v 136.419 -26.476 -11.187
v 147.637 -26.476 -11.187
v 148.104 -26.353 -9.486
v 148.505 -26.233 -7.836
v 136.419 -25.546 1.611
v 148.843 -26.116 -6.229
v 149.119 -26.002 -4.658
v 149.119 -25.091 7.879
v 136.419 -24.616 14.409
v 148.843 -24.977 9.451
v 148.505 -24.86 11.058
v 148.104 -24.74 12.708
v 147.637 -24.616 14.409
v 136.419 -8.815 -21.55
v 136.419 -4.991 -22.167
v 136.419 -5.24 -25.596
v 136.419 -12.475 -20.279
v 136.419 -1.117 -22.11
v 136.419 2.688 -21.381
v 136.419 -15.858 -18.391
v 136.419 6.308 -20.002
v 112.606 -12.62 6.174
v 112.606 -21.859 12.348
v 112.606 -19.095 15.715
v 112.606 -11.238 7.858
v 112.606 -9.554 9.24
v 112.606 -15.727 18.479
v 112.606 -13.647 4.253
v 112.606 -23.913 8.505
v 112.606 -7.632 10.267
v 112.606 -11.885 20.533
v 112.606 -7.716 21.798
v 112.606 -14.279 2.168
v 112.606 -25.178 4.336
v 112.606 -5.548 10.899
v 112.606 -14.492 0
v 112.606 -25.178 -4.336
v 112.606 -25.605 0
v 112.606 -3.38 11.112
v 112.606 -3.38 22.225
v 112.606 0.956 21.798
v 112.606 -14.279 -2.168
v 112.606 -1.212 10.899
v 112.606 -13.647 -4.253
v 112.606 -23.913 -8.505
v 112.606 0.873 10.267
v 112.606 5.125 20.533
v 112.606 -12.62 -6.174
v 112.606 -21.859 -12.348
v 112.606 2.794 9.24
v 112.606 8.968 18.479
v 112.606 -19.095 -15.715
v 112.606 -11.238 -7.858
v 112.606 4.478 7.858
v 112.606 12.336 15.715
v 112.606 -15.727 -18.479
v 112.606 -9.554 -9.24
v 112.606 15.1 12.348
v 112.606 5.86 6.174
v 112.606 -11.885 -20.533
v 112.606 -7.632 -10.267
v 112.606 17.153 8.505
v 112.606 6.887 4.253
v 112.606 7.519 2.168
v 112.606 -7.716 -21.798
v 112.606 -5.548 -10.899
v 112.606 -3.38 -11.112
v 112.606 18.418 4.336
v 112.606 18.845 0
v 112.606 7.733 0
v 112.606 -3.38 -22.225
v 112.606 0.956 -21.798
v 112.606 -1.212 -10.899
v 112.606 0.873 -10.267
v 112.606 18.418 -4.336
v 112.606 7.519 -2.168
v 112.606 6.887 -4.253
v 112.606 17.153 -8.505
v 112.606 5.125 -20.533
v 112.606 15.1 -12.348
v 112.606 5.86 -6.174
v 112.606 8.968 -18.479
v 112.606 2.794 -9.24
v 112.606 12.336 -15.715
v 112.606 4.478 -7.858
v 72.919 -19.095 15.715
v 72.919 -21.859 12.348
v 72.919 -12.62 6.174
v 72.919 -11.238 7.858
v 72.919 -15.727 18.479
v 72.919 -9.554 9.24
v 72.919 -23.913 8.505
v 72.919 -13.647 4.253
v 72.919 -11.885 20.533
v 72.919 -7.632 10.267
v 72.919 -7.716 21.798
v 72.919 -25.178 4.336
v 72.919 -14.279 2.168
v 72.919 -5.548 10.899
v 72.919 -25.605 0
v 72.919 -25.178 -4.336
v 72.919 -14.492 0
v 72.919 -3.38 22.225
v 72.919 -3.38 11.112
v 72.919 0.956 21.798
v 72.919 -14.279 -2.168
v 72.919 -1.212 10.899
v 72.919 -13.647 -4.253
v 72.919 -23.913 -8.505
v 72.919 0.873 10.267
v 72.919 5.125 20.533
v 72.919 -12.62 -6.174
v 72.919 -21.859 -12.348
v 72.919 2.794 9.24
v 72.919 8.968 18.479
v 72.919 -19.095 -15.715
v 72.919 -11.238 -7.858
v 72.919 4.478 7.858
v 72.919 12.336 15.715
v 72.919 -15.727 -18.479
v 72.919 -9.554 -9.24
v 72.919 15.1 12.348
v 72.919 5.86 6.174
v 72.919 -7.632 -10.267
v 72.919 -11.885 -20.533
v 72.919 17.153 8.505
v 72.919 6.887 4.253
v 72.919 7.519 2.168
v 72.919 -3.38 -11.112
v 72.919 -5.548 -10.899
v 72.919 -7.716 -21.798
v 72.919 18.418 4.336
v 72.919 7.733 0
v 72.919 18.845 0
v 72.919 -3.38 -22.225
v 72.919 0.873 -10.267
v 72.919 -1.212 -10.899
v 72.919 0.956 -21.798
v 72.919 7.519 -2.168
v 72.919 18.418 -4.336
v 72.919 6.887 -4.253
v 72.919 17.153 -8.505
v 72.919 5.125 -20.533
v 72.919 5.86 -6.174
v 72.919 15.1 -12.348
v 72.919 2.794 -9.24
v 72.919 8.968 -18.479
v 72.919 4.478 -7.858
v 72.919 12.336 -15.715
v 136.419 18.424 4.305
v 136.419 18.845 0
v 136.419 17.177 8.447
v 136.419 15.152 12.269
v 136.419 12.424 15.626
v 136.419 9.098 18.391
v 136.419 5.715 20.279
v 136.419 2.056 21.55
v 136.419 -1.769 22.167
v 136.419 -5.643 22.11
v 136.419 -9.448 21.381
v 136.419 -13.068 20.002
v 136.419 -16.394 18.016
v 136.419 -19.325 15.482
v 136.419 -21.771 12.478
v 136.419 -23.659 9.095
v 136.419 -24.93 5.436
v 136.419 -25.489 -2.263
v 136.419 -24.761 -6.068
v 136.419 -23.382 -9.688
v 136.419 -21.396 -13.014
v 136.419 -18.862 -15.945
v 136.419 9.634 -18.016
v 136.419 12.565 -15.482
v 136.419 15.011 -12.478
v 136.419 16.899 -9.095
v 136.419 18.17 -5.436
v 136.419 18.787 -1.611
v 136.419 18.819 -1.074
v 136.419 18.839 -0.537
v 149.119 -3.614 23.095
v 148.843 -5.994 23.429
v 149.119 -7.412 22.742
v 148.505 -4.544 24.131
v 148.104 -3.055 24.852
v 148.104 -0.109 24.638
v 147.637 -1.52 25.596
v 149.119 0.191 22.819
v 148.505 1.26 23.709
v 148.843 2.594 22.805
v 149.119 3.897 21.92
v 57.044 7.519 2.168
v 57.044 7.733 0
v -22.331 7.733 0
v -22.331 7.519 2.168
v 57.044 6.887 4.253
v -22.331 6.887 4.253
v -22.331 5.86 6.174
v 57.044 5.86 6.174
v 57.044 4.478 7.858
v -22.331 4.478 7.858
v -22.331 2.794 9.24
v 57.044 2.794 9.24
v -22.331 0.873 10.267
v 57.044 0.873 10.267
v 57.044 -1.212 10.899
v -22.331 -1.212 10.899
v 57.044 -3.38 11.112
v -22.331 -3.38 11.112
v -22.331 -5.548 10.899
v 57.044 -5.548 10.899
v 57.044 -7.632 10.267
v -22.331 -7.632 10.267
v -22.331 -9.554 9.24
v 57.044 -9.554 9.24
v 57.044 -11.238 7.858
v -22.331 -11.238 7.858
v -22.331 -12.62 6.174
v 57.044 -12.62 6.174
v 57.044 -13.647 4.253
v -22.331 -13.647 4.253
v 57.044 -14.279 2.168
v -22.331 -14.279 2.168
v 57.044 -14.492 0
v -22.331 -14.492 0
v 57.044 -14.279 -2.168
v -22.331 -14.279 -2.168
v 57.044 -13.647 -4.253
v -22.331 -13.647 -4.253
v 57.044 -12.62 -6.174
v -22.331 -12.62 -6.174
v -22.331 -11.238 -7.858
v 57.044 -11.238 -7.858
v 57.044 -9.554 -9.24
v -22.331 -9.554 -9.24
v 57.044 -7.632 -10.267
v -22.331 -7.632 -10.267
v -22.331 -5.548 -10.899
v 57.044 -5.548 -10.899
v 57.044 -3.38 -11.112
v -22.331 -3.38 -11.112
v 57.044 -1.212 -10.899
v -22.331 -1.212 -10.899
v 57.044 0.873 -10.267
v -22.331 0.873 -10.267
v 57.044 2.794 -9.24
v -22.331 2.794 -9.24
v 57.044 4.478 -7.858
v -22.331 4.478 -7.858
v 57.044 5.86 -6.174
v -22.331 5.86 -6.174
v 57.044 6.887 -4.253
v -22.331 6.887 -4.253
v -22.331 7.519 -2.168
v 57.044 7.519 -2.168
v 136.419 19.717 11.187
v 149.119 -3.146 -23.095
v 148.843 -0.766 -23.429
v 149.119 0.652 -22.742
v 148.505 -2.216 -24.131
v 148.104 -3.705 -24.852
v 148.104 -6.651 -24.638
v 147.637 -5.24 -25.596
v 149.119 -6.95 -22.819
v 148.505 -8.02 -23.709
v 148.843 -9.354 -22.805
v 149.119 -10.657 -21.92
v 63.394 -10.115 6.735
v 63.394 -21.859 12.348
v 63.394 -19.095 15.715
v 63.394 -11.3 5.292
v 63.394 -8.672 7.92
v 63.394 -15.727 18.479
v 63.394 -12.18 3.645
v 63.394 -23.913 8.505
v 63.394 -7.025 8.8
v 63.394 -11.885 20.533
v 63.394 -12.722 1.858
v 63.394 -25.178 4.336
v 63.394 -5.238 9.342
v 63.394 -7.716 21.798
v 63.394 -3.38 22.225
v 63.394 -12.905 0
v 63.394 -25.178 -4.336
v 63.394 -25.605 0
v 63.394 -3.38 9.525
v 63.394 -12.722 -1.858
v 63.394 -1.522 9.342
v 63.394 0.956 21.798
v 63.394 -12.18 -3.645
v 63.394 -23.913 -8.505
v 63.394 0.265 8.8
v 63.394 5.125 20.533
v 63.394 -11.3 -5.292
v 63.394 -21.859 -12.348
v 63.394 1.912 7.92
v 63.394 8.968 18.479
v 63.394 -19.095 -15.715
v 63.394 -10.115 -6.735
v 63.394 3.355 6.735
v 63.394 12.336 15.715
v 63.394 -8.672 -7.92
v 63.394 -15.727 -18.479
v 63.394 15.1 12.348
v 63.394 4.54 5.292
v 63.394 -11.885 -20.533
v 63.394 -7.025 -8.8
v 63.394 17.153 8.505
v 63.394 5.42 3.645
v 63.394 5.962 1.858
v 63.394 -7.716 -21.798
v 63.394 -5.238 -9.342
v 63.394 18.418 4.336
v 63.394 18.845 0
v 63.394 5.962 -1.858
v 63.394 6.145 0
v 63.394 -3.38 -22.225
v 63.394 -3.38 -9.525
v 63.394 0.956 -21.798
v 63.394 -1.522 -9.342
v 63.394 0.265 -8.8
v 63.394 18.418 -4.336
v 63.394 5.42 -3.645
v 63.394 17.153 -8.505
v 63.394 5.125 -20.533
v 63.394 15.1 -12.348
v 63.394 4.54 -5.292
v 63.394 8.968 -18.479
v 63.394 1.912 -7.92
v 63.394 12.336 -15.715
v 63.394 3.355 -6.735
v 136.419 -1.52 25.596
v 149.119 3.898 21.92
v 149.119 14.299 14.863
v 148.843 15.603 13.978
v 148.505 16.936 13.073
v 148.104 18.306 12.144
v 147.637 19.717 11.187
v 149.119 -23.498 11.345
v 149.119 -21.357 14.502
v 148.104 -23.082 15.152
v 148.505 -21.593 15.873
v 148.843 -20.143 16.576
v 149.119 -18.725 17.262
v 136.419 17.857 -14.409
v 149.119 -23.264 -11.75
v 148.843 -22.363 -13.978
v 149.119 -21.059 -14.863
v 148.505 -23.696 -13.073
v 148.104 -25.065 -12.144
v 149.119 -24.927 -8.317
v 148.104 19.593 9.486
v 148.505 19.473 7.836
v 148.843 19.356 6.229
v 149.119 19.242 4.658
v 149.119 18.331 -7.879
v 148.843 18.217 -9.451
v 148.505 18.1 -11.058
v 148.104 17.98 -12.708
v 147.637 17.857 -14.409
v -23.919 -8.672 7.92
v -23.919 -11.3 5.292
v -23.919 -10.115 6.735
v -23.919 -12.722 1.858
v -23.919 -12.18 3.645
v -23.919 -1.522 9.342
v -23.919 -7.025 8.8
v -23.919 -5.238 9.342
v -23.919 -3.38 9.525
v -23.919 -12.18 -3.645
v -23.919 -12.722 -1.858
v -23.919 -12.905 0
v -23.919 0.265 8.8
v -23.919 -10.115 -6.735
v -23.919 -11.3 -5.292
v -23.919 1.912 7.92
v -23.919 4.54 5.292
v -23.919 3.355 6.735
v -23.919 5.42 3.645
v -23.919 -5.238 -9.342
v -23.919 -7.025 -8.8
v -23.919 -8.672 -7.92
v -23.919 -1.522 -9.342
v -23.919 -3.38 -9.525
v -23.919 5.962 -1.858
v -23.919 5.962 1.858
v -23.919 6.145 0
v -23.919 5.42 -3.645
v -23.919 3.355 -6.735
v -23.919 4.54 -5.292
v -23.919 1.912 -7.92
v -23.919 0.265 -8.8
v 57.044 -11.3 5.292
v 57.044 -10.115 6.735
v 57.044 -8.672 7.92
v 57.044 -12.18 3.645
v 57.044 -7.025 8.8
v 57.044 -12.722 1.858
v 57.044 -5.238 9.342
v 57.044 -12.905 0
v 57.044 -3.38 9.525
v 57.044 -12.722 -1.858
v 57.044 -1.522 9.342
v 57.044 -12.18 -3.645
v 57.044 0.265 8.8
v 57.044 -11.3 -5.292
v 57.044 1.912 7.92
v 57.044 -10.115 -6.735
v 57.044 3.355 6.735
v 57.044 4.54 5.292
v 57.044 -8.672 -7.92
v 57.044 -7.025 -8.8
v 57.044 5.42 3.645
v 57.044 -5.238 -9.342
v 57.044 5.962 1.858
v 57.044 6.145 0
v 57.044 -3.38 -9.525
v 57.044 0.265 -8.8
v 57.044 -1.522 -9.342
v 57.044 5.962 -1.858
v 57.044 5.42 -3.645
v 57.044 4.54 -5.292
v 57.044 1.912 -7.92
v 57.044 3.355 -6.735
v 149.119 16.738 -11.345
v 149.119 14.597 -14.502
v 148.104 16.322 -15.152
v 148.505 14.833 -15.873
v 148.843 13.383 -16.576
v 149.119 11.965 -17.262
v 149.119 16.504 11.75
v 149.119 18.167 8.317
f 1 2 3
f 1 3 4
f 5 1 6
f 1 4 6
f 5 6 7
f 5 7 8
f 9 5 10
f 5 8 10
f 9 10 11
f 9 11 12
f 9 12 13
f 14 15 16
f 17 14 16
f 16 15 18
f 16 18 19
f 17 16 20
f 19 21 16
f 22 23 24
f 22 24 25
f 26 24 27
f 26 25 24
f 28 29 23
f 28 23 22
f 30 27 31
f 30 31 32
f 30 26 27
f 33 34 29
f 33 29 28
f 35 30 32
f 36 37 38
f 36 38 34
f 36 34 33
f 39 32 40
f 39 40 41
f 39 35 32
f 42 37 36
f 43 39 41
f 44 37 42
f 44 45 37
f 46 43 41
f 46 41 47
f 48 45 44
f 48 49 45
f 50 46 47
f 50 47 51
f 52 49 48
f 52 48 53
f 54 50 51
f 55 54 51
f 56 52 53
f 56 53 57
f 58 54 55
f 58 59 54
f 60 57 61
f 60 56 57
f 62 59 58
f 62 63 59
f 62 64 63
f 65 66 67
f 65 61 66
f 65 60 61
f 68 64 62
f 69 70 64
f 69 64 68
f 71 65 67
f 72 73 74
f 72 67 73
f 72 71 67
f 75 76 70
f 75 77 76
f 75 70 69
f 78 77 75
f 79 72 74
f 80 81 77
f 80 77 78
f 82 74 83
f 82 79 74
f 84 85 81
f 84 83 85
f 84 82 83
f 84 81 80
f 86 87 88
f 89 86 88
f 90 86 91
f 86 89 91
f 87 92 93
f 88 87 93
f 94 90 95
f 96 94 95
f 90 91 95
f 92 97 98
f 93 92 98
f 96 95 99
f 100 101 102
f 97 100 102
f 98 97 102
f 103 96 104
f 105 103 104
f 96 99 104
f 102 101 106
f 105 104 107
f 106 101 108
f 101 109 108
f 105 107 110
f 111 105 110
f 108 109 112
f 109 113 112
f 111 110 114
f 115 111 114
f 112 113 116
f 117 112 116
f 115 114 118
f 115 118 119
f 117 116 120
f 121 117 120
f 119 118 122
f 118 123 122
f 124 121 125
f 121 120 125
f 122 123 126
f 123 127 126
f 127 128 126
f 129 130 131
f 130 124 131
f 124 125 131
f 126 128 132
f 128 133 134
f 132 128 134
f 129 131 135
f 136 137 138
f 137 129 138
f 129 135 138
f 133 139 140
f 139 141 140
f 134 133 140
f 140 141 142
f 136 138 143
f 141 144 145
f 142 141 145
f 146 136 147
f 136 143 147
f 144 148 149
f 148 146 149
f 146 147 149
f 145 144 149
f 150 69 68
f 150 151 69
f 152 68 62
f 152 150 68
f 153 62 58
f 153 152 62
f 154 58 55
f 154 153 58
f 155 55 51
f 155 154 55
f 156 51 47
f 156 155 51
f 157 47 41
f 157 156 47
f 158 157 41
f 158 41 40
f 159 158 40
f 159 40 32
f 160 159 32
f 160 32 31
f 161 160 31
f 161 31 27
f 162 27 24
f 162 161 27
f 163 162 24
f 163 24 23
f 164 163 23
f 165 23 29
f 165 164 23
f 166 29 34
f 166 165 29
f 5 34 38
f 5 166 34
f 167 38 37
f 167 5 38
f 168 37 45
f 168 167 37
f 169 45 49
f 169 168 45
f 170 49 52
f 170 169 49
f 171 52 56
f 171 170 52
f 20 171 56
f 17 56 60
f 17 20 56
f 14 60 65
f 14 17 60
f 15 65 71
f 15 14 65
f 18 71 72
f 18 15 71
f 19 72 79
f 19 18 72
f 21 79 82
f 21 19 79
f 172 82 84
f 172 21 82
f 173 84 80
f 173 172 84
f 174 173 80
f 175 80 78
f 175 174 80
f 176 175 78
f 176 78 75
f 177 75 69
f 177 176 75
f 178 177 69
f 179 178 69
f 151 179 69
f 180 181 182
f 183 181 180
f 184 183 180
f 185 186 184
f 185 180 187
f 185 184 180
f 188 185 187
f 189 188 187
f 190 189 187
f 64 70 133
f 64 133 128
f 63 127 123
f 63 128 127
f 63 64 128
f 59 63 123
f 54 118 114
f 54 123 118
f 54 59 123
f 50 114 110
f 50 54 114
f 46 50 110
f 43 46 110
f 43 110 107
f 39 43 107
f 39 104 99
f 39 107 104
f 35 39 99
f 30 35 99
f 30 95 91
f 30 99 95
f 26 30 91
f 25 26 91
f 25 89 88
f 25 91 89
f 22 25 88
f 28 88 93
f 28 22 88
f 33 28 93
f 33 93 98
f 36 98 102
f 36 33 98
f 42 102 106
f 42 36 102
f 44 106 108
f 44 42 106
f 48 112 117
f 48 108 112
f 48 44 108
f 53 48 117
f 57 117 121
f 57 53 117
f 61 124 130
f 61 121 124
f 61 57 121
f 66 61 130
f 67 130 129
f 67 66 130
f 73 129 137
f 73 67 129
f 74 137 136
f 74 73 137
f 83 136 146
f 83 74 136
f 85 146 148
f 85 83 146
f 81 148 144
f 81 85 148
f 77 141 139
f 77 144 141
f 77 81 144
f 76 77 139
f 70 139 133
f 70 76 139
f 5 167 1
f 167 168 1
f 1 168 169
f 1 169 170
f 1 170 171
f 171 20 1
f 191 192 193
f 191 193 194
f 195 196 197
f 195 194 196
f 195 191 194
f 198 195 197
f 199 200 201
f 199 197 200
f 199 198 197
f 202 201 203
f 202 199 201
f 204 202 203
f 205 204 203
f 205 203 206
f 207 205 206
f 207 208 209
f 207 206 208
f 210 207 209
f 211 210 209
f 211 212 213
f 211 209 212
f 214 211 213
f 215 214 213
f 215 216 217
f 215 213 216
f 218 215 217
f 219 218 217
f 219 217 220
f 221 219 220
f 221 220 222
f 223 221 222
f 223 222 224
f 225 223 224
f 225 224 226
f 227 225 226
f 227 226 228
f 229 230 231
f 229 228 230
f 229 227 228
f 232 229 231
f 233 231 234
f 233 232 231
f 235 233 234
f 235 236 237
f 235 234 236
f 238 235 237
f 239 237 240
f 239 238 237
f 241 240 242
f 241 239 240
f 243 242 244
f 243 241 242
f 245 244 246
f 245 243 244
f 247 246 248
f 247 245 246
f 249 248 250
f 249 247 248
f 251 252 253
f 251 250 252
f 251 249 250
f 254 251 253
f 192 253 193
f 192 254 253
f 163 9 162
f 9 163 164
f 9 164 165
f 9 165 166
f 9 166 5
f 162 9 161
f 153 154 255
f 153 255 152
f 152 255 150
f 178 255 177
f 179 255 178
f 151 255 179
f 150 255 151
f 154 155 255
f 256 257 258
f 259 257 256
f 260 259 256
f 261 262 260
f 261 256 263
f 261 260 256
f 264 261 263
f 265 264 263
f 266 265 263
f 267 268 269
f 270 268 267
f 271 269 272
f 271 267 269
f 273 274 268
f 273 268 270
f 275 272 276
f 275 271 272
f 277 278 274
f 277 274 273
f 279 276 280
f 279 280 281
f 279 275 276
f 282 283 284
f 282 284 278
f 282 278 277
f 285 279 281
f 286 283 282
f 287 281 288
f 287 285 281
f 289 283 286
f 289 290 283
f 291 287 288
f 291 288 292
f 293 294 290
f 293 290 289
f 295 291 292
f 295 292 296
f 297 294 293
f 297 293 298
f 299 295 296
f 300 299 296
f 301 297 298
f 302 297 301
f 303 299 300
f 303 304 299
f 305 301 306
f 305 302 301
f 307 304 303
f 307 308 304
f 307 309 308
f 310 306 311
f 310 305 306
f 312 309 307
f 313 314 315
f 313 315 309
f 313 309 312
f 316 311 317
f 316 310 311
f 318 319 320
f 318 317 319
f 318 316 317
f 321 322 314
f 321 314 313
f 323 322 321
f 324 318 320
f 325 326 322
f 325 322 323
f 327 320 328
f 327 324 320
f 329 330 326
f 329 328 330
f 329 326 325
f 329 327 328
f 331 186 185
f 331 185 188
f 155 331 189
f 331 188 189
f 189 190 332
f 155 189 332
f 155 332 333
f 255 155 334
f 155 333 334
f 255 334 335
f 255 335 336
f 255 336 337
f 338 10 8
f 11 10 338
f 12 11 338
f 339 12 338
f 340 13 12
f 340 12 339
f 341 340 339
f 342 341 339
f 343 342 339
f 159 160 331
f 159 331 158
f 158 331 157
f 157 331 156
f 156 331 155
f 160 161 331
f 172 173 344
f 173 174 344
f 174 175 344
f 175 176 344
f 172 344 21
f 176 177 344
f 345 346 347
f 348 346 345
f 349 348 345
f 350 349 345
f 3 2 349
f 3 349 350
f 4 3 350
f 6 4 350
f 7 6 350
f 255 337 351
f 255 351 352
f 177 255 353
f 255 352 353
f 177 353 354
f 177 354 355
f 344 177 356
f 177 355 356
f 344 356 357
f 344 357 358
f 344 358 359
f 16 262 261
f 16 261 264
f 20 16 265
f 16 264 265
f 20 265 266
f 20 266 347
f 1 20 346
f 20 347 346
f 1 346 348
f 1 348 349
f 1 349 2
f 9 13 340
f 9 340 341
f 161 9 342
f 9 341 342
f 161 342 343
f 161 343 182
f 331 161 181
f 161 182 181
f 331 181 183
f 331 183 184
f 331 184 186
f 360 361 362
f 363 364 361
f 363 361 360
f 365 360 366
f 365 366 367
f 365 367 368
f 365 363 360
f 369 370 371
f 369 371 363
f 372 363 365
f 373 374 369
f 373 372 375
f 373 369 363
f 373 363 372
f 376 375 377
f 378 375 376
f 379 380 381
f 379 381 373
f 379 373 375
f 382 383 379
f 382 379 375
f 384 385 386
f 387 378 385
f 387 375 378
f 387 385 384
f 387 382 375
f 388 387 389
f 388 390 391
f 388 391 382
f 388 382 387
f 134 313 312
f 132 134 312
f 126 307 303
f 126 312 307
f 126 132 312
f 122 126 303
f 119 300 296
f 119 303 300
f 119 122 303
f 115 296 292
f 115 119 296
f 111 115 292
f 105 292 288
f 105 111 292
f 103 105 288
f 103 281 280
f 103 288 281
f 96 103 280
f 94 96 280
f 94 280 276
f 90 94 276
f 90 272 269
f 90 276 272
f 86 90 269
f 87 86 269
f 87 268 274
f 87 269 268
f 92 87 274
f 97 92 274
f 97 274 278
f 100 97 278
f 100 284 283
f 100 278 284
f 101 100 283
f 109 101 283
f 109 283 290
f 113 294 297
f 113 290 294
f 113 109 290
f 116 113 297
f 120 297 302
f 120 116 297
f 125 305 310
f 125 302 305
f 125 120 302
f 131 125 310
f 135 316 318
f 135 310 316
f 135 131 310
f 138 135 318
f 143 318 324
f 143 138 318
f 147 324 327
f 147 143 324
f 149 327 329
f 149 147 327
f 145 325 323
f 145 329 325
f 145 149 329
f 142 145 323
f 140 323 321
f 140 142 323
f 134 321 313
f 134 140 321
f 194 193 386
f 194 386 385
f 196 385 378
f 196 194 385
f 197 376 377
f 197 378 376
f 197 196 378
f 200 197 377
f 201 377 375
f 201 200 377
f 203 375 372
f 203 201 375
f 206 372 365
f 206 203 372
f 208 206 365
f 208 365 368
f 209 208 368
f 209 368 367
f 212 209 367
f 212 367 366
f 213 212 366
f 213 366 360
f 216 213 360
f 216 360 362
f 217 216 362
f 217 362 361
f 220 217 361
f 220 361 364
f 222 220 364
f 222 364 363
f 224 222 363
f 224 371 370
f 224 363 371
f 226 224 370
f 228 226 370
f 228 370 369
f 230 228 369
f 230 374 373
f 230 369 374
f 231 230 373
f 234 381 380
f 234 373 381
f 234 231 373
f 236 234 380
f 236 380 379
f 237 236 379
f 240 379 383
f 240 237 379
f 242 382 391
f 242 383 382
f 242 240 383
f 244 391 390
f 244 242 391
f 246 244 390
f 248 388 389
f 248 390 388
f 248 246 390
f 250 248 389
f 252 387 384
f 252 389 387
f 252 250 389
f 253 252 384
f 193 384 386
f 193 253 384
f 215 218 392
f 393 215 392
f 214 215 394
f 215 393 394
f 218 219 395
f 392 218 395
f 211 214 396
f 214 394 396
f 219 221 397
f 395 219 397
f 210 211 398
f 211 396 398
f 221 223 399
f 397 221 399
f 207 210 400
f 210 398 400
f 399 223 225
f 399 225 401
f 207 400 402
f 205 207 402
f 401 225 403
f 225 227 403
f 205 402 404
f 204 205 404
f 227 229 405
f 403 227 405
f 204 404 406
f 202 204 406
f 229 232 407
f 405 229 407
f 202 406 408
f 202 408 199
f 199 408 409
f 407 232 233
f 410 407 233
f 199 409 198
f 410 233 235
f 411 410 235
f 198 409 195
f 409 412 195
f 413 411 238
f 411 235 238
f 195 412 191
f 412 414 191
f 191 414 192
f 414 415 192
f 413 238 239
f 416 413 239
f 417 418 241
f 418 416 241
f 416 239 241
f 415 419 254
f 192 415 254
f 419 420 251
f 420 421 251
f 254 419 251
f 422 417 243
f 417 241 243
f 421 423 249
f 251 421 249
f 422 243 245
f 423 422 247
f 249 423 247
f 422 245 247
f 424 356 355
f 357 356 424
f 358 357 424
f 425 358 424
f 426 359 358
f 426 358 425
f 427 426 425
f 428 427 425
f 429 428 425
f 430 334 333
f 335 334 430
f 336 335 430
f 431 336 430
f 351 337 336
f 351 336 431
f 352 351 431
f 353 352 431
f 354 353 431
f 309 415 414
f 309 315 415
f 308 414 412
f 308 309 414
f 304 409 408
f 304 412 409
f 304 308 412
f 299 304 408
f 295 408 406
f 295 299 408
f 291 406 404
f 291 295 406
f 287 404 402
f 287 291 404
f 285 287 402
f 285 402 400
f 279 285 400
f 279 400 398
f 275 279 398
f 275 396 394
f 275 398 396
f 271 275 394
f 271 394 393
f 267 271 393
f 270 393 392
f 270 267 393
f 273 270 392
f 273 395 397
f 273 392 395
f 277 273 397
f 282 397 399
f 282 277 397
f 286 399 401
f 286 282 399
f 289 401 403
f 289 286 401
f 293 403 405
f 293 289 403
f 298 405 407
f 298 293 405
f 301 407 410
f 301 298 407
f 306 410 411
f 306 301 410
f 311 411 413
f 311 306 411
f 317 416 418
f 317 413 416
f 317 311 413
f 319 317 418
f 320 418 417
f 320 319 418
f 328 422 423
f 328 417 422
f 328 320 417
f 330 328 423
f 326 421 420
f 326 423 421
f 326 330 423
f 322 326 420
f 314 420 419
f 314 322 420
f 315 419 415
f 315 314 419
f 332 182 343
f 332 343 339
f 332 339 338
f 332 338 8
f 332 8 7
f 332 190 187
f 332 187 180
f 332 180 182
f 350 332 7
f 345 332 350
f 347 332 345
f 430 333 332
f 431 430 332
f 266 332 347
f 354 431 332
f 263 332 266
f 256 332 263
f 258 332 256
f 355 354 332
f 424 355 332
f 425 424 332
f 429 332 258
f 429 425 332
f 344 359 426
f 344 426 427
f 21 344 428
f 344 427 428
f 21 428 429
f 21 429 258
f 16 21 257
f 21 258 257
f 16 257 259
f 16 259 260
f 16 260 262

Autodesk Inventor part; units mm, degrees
ref_plane "YZ Plane" through (0, 0, 0) normal (1, 0, 0) x (0, 1, 0)
ref_plane "XZ Plane" through (0, 0, 0) normal (0, 1, 0) x (-1, 0, 0)
sketch "Sketch1" plane through (0, 0, 0) normal (0, 0, 1) x (1, 0, 0)
  line L0 (-23.9187, 7.7326) -> (57.0438, 7.7326)
  line L1 (63.3938, 7.7326) -> (63.3938, 18.8451)
  line L2 (63.3938, 18.8451) -> (72.9188, 18.8451)
  line L3 (72.9188, 18.8451) -> (72.9188, 7.7326)
  line L4 (72.9188, 7.7326) -> (112.6063, 7.7326)
  line L5 (112.6063, 7.7326) -> (112.6063, 18.8451)
  line L6 (112.6063, 18.8451) -> (149.1188, 18.8451)
  line L7 (149.1188, 18.8451) -> (149.1188, -3.3799)
  line L8 (149.1188, -3.3799) -> (-23.9187, -3.3799)
  line L9 (-23.9187, -3.3799) -> (-23.9187, 7.7326)
  line L10 (57.0438, 7.7326) -> (57.0438, 6.1451)
  line L11 (57.0438, 6.1451) -> (63.3938, 6.1451)
  line L12 (63.3938, 6.1451) -> (63.3938, 7.7326)
  dimension "d0" = 11.1125
  dimension "d1" = 22.225
  dimension "d2" = 11.1125
  dimension "d3" = 9.525
  dimension "d4" = 173.0375
  dimension "d5" = 36.5125
  dimension "d6" = 39.6875
  dimension "d7" = 6.35
  dimension "d8" = 9.525
revolve "Revolution1" add sketch "Sketch1" angle 360 about axis through (149.1188, -3.3799, 0) along (-1, 0, 0)
chamfer "Chamfer1" distance 1.5875 angle 45 1 edges at (-23.9187, -14.4924, 0)
sketch "Sketch2" plane through (149.1188, -3.3799, 0) normal (1, 0, 0) x (0, 0, -1)
  circle A0 centre (0, 0) radius 22.225 projected
  line L0 (14.4087, 21.2365) -> (25.5957, -1.8601)
  line L1 (25.5957, -1.8601) -> (11.187, -23.0966)
  line L2 (11.187, -23.0966) -> (-14.4087, -21.2365)
  line L3 (-14.4087, -21.2365) -> (-25.5957, 1.8601)
  line L4 (-25.5957, 1.8601) -> (-11.187, 23.0966)
  line L5 (-11.187, 23.0966) -> (14.4087, 21.2365)
  dimension "d12" = 44.45
extrude "Extrusion1" add sketch "Sketch2" against normal blind 12.7 contours A0 L0 L1 | A0 L5 L0 | L1 L2 A0 | A0 L4 L5 | L2 L3 A0 | A0 L3 L4
ref_plane "Work Plane1" through (130.8625, -3.3799, 0) normal (0, 0, 1) x (1, 0, 0)
sketch "Sketch3" plane through (130.8625, -3.3799, 0) normal (0, 0, 1) x (1, 0, 0)
  line L0 (18.2563, 23.0966) -> (5.5563, 23.0966) projected
  line L1 (18.2563, 1.8601) -> (18.2563, 23.0966) projected
  line L2 (12.9718, 32.2495) -> (24.7507, 11.8479)
  line L3 (12.9718, 32.2495) -> (24.7507, 32.2495)
  line L4 (24.7507, 32.2495) -> (24.7507, 11.8479)
  line L5 (-172.7344, 0) -> (78.6103, 0) projected
  dimension "d16" = 30
revolve "Revolution2" cut sketch "Sketch3" angle 360 about axis through (130.8625, -3.3799, 0) along (1, 0, 0)
thread "Thread1" size "7/8-9 UNC" class "1A" standard "ANSI Unified Screw Threads" full length
properties part number "Wedge_Screw"
